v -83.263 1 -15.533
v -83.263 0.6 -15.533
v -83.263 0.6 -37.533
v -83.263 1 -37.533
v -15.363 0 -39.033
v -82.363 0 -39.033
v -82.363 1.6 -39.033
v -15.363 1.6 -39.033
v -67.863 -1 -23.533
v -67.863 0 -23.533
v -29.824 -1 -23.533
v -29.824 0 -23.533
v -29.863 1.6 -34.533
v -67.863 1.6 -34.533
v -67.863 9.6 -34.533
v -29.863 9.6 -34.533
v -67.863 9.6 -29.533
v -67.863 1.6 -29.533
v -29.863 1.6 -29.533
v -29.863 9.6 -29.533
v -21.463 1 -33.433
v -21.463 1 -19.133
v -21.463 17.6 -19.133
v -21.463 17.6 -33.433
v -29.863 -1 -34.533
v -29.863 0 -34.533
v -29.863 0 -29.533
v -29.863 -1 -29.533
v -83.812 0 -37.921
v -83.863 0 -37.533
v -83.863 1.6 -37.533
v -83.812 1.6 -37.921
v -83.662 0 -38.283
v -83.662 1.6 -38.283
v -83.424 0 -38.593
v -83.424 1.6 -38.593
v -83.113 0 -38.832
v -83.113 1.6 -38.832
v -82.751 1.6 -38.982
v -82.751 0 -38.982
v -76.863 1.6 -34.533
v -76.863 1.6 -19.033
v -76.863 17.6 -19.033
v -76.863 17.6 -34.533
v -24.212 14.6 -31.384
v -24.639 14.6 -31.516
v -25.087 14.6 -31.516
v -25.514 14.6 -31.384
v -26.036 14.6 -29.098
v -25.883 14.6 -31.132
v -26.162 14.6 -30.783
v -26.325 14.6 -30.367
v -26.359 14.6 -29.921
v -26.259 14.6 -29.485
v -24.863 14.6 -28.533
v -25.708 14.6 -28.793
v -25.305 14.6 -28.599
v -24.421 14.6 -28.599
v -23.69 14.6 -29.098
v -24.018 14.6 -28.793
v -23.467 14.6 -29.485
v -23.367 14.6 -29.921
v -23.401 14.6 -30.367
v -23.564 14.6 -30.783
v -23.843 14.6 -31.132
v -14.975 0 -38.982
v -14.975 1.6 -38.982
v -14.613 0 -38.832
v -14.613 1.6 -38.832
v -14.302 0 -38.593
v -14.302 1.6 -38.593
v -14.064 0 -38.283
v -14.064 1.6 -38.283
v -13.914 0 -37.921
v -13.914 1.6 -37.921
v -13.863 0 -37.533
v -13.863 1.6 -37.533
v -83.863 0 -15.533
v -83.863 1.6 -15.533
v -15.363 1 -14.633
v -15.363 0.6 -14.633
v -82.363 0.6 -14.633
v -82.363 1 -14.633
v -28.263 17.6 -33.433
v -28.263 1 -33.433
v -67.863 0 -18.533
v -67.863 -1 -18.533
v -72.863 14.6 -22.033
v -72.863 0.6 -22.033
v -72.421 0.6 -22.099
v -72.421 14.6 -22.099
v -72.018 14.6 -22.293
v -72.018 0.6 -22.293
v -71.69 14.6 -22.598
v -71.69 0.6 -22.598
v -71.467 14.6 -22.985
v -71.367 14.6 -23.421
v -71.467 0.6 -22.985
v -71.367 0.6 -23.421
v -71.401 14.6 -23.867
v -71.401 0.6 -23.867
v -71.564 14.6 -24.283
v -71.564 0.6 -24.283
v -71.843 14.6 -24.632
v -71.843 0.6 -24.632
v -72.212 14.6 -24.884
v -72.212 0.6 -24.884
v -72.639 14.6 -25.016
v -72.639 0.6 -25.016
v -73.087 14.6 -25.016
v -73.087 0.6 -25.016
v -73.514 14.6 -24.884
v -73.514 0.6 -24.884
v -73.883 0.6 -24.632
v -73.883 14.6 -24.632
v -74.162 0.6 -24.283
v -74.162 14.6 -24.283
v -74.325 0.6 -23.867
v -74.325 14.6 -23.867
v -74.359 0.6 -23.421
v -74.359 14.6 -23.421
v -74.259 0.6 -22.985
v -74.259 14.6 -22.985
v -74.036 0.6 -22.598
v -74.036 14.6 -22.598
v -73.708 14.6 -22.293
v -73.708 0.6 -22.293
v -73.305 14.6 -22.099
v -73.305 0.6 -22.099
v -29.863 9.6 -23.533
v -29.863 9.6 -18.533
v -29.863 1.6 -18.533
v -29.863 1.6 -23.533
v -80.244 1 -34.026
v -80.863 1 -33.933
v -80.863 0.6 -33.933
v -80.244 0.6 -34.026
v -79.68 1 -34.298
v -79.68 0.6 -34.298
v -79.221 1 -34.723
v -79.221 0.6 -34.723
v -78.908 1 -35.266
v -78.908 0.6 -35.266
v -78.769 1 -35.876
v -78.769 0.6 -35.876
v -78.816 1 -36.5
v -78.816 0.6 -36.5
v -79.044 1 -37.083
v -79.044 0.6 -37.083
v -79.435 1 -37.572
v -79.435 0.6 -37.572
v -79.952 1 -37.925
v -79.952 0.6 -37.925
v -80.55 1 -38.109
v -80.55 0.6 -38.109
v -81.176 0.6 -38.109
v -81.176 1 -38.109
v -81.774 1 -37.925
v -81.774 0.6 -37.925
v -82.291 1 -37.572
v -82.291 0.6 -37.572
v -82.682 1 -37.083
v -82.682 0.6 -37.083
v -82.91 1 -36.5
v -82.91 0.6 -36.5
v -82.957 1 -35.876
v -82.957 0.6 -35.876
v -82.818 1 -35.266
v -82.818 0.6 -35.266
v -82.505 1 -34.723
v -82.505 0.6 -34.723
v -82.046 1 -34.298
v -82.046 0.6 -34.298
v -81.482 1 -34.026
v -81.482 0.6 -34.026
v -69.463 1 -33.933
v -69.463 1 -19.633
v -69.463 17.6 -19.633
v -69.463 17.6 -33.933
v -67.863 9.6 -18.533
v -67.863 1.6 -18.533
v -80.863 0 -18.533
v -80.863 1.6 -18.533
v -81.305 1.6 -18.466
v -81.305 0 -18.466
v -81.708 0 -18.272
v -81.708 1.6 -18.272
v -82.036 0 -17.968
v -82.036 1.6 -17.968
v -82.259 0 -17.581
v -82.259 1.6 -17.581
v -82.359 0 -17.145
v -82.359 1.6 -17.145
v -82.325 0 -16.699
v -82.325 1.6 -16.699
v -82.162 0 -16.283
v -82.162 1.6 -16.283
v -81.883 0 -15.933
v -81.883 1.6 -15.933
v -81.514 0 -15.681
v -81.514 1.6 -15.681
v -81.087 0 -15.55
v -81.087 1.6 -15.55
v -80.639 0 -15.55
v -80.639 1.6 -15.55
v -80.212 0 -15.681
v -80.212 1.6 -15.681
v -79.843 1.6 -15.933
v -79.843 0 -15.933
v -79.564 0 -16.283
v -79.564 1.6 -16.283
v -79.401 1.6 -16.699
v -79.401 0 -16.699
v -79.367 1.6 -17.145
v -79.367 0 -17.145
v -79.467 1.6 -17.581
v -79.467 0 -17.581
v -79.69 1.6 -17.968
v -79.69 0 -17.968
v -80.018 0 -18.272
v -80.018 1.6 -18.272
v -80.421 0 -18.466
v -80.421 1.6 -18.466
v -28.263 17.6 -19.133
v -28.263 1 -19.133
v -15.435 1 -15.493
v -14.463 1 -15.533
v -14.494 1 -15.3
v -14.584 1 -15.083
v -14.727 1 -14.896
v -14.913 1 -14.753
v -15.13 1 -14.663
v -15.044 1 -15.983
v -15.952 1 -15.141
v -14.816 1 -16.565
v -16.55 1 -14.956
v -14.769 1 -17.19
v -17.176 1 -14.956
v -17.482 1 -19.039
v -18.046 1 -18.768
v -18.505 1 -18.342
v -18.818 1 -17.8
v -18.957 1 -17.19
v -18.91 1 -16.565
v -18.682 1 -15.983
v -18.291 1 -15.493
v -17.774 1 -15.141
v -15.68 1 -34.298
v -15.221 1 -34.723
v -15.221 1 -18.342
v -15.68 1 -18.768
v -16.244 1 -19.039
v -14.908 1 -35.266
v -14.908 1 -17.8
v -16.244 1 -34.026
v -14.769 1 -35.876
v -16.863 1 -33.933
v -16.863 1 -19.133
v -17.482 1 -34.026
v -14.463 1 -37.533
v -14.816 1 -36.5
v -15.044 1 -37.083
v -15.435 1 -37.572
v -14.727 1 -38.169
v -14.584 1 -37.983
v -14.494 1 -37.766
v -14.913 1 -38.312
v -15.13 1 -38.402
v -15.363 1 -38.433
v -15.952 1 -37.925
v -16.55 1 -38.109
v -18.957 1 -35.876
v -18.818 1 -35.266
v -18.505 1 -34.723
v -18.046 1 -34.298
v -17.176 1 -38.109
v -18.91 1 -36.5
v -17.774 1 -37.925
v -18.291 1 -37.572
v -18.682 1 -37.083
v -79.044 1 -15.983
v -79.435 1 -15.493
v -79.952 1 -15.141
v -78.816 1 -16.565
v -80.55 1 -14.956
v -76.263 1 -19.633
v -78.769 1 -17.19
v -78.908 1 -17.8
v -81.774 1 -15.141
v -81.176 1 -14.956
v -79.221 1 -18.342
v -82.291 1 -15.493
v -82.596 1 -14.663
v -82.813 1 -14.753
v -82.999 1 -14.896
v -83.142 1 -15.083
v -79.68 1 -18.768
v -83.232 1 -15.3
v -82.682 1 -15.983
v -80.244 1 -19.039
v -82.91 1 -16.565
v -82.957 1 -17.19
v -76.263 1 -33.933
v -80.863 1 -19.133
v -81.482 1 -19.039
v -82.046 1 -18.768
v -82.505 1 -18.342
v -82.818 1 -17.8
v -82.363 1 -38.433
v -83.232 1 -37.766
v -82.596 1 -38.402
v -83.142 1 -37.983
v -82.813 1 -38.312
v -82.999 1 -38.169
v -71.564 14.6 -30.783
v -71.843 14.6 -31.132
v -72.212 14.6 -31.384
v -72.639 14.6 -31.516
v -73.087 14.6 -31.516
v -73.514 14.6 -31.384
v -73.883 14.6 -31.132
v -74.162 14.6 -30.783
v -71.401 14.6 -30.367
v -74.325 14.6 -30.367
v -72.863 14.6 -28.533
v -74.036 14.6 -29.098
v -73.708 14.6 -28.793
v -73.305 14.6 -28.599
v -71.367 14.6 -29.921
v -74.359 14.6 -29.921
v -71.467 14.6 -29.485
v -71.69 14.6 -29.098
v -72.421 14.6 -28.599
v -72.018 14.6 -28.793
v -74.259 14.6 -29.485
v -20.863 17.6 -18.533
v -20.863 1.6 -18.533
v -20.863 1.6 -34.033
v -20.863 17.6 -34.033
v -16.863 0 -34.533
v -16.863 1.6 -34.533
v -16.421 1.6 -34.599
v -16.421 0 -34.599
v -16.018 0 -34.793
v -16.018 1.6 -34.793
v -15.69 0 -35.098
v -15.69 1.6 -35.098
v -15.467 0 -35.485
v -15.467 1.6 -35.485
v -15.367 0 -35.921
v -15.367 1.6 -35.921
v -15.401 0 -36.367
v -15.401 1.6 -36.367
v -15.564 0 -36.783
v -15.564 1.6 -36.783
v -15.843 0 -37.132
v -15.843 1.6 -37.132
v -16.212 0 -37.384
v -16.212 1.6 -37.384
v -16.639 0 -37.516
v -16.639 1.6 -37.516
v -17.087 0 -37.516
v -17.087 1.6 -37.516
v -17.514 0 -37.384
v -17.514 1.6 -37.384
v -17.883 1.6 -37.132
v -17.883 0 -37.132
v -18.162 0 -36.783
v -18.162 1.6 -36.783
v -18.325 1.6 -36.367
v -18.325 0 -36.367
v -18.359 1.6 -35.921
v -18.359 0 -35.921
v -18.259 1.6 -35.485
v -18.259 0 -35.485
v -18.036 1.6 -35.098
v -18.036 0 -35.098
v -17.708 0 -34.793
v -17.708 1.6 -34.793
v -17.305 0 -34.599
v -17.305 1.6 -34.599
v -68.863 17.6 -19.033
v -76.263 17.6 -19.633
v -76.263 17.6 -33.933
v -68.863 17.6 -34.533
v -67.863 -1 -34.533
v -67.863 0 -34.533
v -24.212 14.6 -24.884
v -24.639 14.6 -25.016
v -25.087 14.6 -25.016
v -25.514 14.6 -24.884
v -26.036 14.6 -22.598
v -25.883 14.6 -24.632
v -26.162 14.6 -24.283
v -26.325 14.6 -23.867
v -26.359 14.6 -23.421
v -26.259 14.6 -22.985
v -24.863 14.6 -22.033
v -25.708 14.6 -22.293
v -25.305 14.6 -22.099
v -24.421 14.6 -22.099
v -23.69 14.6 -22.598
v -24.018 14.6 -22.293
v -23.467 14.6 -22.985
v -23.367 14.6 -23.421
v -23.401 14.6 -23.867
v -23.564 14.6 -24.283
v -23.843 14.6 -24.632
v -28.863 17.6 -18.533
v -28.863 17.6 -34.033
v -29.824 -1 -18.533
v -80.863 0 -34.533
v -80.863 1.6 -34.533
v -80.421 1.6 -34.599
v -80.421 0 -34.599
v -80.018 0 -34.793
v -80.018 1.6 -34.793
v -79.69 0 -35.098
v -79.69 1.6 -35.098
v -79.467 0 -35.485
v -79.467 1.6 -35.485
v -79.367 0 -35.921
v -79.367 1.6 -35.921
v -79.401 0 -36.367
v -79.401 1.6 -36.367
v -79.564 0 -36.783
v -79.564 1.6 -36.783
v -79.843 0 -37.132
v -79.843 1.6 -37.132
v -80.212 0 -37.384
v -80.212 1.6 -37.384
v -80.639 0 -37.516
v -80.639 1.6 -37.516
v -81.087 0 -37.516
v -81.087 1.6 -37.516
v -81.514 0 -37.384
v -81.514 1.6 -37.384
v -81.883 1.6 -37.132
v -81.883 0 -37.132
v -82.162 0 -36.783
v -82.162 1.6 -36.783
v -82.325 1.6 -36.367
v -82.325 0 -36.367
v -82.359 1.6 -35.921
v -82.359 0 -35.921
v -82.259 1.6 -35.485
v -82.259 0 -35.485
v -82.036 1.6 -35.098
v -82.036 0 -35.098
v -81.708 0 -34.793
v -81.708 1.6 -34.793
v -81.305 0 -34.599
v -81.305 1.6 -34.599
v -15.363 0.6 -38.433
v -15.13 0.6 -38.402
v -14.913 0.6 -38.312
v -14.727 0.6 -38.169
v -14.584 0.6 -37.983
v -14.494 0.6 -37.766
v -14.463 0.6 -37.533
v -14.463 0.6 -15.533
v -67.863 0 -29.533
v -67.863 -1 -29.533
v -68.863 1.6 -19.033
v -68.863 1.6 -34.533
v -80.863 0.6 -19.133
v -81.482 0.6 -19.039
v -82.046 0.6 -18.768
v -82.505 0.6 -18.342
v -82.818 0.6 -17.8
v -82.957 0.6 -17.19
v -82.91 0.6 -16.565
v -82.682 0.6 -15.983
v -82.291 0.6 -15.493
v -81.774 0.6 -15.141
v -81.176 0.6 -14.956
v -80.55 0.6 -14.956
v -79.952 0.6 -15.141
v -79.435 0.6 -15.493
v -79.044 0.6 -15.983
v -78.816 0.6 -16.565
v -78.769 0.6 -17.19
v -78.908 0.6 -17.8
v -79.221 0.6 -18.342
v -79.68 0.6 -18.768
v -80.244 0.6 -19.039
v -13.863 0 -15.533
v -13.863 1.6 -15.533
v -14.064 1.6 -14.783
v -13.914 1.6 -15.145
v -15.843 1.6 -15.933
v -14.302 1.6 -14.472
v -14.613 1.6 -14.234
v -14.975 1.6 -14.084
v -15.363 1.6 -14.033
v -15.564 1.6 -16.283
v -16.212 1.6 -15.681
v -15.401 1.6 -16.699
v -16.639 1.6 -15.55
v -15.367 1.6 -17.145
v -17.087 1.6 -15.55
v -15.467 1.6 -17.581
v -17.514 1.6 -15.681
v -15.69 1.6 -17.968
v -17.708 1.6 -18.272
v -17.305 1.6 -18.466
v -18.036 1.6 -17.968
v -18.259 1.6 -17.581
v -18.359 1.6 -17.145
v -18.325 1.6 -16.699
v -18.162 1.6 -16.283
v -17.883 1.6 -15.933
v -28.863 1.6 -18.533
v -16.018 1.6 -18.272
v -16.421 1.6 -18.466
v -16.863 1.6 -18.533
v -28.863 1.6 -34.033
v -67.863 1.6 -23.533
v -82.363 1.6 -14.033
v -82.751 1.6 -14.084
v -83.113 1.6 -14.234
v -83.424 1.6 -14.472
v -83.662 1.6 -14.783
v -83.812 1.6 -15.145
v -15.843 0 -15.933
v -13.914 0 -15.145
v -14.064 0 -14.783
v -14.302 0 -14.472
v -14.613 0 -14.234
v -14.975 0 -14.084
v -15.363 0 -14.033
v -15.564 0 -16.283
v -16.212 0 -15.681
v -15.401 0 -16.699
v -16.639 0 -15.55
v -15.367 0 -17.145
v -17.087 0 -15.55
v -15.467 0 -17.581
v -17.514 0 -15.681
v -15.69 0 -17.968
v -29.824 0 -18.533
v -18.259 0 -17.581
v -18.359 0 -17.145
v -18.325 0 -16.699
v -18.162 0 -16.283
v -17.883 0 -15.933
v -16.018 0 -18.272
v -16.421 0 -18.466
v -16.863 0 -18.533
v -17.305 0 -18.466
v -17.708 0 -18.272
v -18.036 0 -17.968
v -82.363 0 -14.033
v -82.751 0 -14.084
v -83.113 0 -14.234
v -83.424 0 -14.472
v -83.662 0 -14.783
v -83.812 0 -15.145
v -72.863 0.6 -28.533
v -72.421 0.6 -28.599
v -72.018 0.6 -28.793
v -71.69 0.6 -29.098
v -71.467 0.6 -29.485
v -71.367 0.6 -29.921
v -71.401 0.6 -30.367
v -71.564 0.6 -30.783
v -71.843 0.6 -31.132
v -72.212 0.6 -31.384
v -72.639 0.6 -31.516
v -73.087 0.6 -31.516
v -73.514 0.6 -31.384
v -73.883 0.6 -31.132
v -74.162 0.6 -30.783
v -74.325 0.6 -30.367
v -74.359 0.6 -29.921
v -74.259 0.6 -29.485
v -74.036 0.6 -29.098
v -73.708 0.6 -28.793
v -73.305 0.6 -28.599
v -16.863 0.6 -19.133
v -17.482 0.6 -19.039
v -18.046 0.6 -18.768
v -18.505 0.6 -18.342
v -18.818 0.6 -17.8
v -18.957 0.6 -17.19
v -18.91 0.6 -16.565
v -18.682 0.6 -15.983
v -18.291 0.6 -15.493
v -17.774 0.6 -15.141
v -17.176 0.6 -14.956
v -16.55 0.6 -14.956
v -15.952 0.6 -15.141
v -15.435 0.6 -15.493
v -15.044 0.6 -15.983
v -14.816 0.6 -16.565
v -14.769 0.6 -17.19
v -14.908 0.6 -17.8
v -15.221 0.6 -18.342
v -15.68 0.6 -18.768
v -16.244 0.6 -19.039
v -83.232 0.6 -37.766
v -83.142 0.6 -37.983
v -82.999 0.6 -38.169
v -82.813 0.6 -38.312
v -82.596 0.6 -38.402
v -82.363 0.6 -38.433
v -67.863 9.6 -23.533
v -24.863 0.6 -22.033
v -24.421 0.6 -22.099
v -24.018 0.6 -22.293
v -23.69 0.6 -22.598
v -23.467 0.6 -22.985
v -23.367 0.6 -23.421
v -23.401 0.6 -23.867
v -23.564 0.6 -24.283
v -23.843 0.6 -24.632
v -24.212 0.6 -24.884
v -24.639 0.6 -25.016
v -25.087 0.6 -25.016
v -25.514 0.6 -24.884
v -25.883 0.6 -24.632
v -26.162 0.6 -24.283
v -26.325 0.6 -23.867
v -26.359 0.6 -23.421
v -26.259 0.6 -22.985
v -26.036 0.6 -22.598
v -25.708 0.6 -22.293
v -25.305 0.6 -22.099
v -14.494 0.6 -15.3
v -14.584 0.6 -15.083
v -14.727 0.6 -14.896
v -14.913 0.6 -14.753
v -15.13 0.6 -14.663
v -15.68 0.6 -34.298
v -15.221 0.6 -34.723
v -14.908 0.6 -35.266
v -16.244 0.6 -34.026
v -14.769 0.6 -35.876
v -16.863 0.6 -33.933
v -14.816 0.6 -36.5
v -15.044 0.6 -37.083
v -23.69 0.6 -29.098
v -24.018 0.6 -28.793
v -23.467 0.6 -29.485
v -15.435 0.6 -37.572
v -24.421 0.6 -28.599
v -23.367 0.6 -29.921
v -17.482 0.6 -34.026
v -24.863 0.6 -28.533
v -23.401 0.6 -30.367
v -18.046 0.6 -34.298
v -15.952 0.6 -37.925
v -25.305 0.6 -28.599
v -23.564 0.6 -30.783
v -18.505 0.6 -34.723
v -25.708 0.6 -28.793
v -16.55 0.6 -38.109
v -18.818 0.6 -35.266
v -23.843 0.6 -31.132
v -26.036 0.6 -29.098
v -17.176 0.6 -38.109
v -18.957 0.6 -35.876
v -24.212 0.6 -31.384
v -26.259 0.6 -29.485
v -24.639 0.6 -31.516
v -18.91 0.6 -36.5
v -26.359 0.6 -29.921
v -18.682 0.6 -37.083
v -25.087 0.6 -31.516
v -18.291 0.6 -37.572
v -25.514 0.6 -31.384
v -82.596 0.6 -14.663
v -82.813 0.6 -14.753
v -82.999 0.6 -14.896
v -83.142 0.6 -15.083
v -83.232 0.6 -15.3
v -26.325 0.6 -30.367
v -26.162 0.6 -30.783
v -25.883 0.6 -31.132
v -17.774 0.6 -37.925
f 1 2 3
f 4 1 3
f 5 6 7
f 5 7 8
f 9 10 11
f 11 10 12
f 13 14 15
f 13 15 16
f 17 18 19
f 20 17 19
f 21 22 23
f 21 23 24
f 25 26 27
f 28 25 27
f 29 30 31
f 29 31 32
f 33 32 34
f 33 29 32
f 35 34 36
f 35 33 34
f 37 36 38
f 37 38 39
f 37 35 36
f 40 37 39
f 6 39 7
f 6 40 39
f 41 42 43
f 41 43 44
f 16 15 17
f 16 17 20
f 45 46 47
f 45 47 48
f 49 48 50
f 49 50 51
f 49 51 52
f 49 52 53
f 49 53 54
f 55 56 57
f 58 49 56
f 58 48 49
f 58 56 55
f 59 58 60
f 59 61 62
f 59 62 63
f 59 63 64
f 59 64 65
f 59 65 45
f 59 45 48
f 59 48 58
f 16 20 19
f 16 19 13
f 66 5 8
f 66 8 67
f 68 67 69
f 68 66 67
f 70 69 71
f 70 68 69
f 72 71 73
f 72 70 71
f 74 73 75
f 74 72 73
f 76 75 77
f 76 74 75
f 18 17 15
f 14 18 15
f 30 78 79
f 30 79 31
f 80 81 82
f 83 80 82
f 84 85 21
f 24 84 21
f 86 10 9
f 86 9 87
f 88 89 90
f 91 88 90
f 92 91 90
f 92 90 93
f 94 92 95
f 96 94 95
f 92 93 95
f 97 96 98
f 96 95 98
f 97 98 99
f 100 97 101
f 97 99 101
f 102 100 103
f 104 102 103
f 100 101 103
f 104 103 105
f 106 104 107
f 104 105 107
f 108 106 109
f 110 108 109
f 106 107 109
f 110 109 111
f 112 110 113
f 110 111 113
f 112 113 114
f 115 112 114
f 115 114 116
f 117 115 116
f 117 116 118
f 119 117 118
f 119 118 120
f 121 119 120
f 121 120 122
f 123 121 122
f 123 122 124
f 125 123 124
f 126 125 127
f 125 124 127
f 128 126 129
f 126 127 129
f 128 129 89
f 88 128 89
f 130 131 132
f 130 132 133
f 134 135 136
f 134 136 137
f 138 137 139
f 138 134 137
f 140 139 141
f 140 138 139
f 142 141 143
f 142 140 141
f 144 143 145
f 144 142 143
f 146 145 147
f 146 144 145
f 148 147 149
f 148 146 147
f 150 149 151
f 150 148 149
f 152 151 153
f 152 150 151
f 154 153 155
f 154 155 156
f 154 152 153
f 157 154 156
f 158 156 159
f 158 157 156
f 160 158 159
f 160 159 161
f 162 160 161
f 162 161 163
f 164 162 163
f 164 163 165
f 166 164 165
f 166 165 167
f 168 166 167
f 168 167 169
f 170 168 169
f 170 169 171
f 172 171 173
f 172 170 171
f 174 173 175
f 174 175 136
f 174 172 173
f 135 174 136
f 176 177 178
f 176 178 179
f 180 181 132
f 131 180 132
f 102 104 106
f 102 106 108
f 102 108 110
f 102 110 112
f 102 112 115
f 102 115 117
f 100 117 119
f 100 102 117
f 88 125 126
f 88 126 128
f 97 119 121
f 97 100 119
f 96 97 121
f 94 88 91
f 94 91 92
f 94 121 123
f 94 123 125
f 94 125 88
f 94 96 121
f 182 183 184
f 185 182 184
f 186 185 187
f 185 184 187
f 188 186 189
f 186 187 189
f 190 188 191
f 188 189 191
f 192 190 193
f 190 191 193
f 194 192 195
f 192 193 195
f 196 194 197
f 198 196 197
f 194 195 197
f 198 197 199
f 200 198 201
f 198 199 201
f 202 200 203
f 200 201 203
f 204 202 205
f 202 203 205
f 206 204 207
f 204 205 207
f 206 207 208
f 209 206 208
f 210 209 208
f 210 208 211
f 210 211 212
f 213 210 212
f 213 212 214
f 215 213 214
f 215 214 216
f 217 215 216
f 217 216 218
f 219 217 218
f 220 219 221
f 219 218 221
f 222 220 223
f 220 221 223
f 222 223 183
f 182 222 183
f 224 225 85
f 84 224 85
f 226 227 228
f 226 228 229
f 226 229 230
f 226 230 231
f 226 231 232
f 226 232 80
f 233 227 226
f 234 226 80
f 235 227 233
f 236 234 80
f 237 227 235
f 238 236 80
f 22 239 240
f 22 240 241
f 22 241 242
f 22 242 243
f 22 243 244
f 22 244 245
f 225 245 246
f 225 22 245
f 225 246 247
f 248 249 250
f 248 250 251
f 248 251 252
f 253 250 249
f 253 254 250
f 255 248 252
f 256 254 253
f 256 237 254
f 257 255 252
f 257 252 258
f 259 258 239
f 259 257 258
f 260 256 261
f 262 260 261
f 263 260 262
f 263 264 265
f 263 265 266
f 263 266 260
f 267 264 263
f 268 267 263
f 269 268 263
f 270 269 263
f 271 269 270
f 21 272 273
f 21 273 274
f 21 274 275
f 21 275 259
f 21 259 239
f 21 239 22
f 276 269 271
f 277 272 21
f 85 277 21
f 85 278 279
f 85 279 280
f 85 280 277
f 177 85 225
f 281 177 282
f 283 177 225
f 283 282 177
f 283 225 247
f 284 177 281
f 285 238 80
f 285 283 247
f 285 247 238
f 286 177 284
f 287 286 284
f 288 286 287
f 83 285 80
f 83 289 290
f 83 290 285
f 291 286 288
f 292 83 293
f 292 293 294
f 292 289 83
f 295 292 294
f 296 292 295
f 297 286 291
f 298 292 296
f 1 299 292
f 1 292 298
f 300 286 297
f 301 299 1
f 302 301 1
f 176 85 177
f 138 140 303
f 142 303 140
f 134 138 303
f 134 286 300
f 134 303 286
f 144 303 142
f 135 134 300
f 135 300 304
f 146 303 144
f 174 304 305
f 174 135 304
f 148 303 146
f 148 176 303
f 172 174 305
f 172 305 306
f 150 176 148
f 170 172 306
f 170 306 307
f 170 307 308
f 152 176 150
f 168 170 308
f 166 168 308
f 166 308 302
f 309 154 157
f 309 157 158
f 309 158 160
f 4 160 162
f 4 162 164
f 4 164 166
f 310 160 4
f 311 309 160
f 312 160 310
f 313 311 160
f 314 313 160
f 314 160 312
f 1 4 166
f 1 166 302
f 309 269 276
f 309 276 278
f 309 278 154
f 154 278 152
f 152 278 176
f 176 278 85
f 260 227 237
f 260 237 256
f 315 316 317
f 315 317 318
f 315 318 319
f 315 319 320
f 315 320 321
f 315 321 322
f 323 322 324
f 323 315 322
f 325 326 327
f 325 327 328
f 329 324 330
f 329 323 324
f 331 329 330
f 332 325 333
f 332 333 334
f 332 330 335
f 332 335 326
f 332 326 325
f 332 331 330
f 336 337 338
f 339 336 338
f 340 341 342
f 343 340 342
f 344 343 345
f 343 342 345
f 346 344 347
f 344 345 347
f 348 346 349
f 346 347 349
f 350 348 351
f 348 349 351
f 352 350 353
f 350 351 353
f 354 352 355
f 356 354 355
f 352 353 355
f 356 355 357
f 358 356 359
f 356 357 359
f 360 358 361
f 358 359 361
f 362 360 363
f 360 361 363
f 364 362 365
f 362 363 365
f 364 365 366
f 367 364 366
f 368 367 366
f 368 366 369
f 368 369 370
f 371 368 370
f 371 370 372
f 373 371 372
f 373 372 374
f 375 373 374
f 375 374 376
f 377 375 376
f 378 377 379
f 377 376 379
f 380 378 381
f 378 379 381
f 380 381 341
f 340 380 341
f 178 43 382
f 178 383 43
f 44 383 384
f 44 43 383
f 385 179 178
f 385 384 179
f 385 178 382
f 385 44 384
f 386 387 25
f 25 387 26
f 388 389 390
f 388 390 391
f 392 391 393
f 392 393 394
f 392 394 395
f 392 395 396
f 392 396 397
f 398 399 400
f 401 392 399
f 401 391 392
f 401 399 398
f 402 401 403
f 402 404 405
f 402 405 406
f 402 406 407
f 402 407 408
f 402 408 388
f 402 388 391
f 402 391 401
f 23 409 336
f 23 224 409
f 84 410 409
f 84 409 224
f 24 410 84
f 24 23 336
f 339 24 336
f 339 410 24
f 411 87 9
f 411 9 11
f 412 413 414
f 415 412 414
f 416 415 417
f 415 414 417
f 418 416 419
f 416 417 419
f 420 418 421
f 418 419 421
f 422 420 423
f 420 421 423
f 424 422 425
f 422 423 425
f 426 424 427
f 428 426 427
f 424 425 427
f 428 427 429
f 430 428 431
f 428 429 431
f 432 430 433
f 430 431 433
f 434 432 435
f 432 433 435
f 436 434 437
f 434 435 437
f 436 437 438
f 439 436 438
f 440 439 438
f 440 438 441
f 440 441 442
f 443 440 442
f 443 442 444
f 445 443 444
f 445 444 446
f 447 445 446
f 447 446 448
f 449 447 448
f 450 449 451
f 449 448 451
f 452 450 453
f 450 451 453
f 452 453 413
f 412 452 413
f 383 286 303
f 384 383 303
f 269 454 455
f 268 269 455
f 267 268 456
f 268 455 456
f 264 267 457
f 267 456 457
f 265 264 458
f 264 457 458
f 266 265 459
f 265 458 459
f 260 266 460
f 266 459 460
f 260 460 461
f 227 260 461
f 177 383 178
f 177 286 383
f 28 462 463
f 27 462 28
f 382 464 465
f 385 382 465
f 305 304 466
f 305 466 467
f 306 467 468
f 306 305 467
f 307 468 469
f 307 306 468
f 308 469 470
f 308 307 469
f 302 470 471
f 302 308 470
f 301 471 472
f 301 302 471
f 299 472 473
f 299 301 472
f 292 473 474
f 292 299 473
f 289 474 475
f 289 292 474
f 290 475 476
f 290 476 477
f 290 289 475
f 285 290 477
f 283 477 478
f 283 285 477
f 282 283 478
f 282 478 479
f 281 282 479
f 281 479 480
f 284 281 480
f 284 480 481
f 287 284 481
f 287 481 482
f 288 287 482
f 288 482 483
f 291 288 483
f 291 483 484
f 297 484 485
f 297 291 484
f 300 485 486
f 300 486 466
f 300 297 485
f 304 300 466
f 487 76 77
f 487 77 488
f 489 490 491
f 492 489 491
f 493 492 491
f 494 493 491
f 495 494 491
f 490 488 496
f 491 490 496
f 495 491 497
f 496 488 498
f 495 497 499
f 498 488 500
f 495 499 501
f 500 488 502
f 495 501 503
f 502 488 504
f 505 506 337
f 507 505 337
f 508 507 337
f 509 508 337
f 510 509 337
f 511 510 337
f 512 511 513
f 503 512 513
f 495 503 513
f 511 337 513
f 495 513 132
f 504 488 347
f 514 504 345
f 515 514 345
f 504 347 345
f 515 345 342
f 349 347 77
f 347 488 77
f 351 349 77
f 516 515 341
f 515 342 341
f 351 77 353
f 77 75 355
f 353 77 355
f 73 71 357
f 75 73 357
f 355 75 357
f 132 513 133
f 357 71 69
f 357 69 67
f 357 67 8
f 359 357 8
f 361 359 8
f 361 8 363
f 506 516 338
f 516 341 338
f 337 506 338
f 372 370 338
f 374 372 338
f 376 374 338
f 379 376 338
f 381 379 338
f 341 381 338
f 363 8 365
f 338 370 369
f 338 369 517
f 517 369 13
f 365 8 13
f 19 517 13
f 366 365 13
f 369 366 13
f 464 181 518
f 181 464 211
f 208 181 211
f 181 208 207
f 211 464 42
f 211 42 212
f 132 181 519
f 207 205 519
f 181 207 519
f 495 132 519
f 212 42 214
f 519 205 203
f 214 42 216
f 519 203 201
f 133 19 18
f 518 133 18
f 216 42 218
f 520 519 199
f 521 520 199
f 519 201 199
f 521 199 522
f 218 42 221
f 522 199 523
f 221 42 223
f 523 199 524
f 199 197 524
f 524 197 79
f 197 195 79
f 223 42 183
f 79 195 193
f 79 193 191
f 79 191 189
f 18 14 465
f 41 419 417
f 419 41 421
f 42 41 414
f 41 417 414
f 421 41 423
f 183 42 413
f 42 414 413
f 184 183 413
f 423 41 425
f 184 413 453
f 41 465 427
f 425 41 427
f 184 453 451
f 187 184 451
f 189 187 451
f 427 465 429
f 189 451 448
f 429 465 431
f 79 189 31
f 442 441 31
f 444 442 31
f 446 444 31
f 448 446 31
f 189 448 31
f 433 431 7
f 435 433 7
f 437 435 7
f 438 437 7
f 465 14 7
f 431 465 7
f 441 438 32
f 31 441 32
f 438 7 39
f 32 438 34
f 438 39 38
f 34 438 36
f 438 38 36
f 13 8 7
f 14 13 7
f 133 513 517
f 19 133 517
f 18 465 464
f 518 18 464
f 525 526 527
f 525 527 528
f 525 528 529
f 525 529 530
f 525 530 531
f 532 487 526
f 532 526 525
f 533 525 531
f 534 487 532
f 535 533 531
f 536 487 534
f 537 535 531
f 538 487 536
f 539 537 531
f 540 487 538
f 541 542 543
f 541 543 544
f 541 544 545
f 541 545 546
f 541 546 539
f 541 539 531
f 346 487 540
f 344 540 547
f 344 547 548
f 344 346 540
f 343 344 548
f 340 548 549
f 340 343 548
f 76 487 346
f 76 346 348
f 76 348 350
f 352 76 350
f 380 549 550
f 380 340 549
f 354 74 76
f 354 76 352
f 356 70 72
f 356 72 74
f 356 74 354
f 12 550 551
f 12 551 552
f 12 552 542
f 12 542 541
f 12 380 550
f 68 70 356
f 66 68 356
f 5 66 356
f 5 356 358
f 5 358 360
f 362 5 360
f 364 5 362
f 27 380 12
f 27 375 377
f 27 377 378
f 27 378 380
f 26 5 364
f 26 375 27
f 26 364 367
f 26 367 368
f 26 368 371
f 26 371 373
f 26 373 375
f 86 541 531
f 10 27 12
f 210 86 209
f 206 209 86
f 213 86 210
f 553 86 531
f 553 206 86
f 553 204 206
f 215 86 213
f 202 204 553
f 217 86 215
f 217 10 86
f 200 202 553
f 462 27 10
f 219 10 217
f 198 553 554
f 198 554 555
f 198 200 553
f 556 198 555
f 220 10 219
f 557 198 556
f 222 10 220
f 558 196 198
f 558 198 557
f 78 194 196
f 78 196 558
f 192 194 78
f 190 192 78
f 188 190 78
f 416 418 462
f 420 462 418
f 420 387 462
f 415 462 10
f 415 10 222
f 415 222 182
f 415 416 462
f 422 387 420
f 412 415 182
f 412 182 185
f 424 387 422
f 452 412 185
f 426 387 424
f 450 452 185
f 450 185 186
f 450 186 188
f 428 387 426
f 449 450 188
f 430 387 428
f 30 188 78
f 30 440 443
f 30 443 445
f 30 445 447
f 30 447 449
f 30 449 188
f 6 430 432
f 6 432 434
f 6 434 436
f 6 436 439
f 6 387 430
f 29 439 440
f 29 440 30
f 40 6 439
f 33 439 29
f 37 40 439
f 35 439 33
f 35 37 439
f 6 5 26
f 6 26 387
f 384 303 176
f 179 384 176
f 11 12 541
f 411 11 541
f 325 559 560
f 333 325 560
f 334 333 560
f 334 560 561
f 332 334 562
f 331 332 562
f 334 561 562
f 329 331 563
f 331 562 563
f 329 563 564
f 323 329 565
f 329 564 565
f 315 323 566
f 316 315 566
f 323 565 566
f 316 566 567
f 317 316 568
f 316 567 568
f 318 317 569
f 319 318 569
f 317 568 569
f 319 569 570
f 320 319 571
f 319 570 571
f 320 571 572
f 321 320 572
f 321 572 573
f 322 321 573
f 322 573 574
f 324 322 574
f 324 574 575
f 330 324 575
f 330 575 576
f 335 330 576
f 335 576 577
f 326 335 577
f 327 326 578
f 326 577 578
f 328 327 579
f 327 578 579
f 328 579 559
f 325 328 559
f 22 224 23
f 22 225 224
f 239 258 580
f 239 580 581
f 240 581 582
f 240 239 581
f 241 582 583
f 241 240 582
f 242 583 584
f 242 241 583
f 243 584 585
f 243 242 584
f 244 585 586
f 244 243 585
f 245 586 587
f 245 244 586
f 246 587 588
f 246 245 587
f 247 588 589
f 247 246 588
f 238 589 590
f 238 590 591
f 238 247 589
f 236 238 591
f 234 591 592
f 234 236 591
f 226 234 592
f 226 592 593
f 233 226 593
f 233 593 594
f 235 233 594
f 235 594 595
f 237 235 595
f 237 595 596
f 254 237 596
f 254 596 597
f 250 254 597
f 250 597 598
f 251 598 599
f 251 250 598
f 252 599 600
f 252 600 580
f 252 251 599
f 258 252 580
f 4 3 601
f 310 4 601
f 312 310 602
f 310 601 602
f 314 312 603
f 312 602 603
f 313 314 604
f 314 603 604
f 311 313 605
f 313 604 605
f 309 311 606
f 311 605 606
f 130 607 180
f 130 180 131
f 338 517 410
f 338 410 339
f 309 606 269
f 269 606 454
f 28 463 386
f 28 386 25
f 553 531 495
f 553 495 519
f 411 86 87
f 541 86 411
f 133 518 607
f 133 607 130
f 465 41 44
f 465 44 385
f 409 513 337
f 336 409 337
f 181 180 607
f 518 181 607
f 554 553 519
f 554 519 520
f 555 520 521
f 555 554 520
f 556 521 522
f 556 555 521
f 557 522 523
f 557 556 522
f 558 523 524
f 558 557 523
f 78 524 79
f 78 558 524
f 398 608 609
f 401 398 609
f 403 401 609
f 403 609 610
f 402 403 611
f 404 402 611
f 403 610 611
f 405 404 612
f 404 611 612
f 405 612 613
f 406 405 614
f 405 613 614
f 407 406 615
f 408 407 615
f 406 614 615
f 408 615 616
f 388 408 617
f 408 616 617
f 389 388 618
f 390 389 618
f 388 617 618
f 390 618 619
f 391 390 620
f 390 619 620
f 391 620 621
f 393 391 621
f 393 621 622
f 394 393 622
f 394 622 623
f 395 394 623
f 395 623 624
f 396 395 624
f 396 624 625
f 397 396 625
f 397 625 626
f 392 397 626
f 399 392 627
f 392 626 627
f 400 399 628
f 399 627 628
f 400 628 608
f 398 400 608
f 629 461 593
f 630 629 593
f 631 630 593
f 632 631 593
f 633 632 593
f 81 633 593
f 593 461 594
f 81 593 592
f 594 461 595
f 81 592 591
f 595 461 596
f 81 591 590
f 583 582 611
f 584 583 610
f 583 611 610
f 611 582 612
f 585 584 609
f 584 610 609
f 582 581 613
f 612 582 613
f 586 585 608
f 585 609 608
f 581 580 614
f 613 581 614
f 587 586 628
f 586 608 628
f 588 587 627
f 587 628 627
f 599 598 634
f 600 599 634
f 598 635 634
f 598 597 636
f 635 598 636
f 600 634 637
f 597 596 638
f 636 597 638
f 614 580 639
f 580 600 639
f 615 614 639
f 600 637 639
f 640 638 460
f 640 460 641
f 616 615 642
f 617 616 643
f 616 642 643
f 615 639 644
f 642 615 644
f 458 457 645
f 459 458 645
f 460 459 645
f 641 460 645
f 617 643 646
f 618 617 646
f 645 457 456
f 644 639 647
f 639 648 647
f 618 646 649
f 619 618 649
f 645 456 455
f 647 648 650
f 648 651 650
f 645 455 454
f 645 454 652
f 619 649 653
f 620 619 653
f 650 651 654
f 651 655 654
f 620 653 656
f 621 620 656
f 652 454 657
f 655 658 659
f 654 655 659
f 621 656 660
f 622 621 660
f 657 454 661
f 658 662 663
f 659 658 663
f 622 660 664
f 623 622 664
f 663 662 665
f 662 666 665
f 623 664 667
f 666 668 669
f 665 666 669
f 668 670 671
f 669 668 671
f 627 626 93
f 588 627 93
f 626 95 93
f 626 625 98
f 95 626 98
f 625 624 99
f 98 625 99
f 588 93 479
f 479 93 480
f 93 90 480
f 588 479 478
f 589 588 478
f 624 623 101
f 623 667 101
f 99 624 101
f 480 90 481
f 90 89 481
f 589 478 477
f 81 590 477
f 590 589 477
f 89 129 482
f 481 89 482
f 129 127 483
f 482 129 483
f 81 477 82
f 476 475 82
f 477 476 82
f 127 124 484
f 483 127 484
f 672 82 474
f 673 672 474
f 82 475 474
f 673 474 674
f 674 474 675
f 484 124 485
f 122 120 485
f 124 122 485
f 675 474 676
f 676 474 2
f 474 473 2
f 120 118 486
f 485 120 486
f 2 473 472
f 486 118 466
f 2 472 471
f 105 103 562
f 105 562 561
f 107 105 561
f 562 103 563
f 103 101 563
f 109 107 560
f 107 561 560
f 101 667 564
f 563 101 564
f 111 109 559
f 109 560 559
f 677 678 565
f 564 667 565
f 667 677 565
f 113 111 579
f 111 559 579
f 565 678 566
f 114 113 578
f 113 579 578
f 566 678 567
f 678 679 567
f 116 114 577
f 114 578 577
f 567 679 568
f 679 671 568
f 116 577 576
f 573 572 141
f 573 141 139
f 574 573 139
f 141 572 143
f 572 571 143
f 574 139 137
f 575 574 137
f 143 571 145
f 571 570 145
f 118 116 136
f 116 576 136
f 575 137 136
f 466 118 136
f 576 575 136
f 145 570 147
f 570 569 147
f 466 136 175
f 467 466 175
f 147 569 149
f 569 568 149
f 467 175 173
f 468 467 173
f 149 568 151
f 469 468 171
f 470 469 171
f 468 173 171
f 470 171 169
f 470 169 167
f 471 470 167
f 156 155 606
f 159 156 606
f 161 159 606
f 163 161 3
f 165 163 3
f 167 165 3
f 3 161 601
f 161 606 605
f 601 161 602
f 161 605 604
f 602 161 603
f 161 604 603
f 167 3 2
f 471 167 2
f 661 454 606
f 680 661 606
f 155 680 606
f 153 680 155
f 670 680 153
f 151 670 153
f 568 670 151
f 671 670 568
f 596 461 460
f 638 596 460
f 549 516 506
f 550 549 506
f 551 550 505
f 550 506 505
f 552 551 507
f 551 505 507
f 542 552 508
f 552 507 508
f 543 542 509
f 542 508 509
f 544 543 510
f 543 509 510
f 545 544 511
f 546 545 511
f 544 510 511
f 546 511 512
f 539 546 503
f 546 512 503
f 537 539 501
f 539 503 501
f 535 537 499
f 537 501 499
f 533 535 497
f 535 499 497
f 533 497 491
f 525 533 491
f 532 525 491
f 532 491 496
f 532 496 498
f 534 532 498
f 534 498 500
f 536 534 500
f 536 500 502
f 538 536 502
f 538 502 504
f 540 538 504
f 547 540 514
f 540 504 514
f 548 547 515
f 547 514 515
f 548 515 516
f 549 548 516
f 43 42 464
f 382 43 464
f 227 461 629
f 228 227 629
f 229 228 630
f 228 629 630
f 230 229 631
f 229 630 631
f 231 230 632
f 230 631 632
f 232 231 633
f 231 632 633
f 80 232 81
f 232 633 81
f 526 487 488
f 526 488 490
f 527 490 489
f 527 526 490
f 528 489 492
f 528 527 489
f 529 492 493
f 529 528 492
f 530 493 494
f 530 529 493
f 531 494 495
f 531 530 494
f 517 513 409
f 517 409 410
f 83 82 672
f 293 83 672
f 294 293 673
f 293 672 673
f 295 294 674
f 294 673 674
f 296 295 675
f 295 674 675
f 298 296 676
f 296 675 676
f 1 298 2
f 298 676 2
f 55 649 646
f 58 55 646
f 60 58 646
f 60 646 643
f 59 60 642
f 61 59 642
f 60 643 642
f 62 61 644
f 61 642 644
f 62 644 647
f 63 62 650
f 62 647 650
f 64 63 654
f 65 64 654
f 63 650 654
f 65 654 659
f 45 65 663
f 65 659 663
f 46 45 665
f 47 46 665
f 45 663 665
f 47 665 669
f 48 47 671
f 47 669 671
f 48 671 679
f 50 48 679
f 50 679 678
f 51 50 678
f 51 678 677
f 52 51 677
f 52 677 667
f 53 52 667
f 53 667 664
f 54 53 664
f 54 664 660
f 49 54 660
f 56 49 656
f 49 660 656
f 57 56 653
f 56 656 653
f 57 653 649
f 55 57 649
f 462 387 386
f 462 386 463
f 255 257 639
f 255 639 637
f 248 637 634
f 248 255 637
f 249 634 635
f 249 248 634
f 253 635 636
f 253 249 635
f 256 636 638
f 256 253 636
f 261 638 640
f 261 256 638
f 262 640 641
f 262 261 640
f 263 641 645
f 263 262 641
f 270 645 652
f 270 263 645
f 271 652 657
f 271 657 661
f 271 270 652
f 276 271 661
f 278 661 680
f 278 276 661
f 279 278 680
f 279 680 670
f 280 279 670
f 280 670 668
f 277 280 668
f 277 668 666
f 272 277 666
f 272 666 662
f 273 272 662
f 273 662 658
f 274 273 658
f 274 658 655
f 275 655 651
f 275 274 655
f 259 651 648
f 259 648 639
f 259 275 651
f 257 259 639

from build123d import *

# Parameters (mm, degrees)
EXTRUDE_1_DEPTH     = 1.6
SKETCH_3_R          = 1.5
CUT_EXTRUDE_1_DEPTH = 1.6
SKETCH_8_W          = 8
SKETCH_8_H          = 15.5
EXTRUDE_2_DEPTH     = 16
SHELL_1_T           = -0.6
SKETCH_11_R         = 1.5
EXTRUDE_3_DEPTH     = 14
SKETCH_12_W         = 38
SKETCH_12_H         = 5
EXTRUDE_4_DEPTH     = 8
SKETCH_17_W         = 38.038888129
SKETCH_17_H         = 5
SKETCH_17_W_2       = 38
EXTRUDE_5_DEPTH     = 1


with BuildPart() as part:
    # 草图2 → 凸台-拉伸1 (new body)
    with BuildSketch(Plane(origin=(0, 0, 0), x_dir=(1, 0, 0), z_dir=(0, 1, 0))):
        with BuildLine():
            Line((-82.363056433, 39.03274813), (-15.363056433, 39.03274813))
            ThreePointArc((-15.363056433, 39.03274813), (-14.302396261, 38.593408302), (-13.863056433, 37.53274813))
            Line((-13.863056433, 37.53274813), (-13.863056433, 15.53274813))
            ThreePointArc((-13.863056433, 15.53274813), (-14.302396261, 14.472087958), (-15.363056433, 14.03274813))
            Line((-15.363056433, 14.03274813), (-82.363056433, 14.03274813))
            ThreePointArc((-82.363056433, 14.03274813), (-83.423716605, 14.472087958), (-83.863056433, 15.53274813))
            Line((-83.863056433, 15.53274813), (-83.863056433, 37.53274813))
            ThreePointArc((-83.863056433, 37.53274813), (-83.423716605, 38.593408302), (-82.363056433, 39.03274813))
        make_face()
    extrude(amount=EXTRUDE_1_DEPTH)

    # 草图3 → 切除-拉伸1 (cut)
    with BuildSketch(Plane(origin=(0, 1.6, 0), x_dir=(1, 0, 0), z_dir=(0, 1, 0))):
        with Locations(Location((-80.863056433, 36.03274813, 0), (0, 0, 270))):
            Circle(SKETCH_3_R)
        with Locations(Location((-16.863056433, 36.03274813, 0), (0, 0, 270))):
            Circle(SKETCH_3_R)
        with Locations(Location((-16.863056433, 17.03274813, 0), (0, 0, 90))):
            Circle(SKETCH_3_R)
        with Locations(Location((-80.863056433, 17.03274813, 0), (0, 0, 90))):
            Circle(SKETCH_3_R)
    extrude(amount=-CUT_EXTRUDE_1_DEPTH, mode=Mode.SUBTRACT)

    # 草图8 → 凸台-拉伸2 (add)
    with BuildSketch(Plane(origin=(0, 1.6, 0), x_dir=(1, 0, 0), z_dir=(0, 1, 0))):
        with Locations((-72.863056433, 26.78274813)):
            Rectangle(SKETCH_8_W, SKETCH_8_H)
        with Locations((-24.863056433, 26.28274813)):
            Rectangle(SKETCH_8_W, SKETCH_8_H)
    extrude(amount=EXTRUDE_2_DEPTH)

    # 抽壳1
    shell_1_openings = [part.faces().sort_by_distance(p)[0] for p in [
        (-72.863056433, 17.6, -26.78274813),
        (-24.863056433, 17.6, -26.28274813),
    ]]
    offset(amount=SHELL_1_T, openings=shell_1_openings, kind=Kind.INTERSECTION)

    # 草图11 → 凸台-拉伸3 (add)
    with BuildSketch(Plane(origin=(0, 0.6, 0), x_dir=(1, 0, 0), z_dir=(0, 1, 0))):
        with Locations(Location((-72.863056433, 30.03274813, 0), (0, 0, 270))):
            Circle(SKETCH_11_R)
        with Locations(Location((-72.863056433, 23.53274813, 0), (0, 0, 270))):
            Circle(SKETCH_11_R)
        with Locations(Location((-24.863056433, 30.03274813, 0), (0, 0, 270))):
            Circle(SKETCH_11_R)
        with Locations(Location((-24.863056433, 23.53274813, 0), (0, 0, 270))):
            Circle(SKETCH_11_R)
    extrude(amount=EXTRUDE_3_DEPTH)

    # 草图12 → 凸台-拉伸4 (add)
    with BuildSketch(Plane(origin=(0, 1.6, 0), x_dir=(1, 0, 0), z_dir=(0, 1, 0))):
        with Locations((-48.863056433, 32.03274813)):
            Rectangle(SKETCH_12_W, SKETCH_12_H)
        with Locations((-48.863056433, 21.03274813)):
            Rectangle(SKETCH_12_W, SKETCH_12_H)
    extrude(amount=EXTRUDE_4_DEPTH)

    # 草图17 → 凸台-拉伸5 (add)
    with BuildSketch(Plane.XZ):
        with Locations((-48.843612369, -21.03274813)):
            Rectangle(SKETCH_17_W, SKETCH_17_H)
        with Locations((-48.863056433, -32.03274813)):
            Rectangle(SKETCH_17_W_2, SKETCH_17_H)
    extrude(amount=EXTRUDE_5_DEPTH)


solid = part.part
